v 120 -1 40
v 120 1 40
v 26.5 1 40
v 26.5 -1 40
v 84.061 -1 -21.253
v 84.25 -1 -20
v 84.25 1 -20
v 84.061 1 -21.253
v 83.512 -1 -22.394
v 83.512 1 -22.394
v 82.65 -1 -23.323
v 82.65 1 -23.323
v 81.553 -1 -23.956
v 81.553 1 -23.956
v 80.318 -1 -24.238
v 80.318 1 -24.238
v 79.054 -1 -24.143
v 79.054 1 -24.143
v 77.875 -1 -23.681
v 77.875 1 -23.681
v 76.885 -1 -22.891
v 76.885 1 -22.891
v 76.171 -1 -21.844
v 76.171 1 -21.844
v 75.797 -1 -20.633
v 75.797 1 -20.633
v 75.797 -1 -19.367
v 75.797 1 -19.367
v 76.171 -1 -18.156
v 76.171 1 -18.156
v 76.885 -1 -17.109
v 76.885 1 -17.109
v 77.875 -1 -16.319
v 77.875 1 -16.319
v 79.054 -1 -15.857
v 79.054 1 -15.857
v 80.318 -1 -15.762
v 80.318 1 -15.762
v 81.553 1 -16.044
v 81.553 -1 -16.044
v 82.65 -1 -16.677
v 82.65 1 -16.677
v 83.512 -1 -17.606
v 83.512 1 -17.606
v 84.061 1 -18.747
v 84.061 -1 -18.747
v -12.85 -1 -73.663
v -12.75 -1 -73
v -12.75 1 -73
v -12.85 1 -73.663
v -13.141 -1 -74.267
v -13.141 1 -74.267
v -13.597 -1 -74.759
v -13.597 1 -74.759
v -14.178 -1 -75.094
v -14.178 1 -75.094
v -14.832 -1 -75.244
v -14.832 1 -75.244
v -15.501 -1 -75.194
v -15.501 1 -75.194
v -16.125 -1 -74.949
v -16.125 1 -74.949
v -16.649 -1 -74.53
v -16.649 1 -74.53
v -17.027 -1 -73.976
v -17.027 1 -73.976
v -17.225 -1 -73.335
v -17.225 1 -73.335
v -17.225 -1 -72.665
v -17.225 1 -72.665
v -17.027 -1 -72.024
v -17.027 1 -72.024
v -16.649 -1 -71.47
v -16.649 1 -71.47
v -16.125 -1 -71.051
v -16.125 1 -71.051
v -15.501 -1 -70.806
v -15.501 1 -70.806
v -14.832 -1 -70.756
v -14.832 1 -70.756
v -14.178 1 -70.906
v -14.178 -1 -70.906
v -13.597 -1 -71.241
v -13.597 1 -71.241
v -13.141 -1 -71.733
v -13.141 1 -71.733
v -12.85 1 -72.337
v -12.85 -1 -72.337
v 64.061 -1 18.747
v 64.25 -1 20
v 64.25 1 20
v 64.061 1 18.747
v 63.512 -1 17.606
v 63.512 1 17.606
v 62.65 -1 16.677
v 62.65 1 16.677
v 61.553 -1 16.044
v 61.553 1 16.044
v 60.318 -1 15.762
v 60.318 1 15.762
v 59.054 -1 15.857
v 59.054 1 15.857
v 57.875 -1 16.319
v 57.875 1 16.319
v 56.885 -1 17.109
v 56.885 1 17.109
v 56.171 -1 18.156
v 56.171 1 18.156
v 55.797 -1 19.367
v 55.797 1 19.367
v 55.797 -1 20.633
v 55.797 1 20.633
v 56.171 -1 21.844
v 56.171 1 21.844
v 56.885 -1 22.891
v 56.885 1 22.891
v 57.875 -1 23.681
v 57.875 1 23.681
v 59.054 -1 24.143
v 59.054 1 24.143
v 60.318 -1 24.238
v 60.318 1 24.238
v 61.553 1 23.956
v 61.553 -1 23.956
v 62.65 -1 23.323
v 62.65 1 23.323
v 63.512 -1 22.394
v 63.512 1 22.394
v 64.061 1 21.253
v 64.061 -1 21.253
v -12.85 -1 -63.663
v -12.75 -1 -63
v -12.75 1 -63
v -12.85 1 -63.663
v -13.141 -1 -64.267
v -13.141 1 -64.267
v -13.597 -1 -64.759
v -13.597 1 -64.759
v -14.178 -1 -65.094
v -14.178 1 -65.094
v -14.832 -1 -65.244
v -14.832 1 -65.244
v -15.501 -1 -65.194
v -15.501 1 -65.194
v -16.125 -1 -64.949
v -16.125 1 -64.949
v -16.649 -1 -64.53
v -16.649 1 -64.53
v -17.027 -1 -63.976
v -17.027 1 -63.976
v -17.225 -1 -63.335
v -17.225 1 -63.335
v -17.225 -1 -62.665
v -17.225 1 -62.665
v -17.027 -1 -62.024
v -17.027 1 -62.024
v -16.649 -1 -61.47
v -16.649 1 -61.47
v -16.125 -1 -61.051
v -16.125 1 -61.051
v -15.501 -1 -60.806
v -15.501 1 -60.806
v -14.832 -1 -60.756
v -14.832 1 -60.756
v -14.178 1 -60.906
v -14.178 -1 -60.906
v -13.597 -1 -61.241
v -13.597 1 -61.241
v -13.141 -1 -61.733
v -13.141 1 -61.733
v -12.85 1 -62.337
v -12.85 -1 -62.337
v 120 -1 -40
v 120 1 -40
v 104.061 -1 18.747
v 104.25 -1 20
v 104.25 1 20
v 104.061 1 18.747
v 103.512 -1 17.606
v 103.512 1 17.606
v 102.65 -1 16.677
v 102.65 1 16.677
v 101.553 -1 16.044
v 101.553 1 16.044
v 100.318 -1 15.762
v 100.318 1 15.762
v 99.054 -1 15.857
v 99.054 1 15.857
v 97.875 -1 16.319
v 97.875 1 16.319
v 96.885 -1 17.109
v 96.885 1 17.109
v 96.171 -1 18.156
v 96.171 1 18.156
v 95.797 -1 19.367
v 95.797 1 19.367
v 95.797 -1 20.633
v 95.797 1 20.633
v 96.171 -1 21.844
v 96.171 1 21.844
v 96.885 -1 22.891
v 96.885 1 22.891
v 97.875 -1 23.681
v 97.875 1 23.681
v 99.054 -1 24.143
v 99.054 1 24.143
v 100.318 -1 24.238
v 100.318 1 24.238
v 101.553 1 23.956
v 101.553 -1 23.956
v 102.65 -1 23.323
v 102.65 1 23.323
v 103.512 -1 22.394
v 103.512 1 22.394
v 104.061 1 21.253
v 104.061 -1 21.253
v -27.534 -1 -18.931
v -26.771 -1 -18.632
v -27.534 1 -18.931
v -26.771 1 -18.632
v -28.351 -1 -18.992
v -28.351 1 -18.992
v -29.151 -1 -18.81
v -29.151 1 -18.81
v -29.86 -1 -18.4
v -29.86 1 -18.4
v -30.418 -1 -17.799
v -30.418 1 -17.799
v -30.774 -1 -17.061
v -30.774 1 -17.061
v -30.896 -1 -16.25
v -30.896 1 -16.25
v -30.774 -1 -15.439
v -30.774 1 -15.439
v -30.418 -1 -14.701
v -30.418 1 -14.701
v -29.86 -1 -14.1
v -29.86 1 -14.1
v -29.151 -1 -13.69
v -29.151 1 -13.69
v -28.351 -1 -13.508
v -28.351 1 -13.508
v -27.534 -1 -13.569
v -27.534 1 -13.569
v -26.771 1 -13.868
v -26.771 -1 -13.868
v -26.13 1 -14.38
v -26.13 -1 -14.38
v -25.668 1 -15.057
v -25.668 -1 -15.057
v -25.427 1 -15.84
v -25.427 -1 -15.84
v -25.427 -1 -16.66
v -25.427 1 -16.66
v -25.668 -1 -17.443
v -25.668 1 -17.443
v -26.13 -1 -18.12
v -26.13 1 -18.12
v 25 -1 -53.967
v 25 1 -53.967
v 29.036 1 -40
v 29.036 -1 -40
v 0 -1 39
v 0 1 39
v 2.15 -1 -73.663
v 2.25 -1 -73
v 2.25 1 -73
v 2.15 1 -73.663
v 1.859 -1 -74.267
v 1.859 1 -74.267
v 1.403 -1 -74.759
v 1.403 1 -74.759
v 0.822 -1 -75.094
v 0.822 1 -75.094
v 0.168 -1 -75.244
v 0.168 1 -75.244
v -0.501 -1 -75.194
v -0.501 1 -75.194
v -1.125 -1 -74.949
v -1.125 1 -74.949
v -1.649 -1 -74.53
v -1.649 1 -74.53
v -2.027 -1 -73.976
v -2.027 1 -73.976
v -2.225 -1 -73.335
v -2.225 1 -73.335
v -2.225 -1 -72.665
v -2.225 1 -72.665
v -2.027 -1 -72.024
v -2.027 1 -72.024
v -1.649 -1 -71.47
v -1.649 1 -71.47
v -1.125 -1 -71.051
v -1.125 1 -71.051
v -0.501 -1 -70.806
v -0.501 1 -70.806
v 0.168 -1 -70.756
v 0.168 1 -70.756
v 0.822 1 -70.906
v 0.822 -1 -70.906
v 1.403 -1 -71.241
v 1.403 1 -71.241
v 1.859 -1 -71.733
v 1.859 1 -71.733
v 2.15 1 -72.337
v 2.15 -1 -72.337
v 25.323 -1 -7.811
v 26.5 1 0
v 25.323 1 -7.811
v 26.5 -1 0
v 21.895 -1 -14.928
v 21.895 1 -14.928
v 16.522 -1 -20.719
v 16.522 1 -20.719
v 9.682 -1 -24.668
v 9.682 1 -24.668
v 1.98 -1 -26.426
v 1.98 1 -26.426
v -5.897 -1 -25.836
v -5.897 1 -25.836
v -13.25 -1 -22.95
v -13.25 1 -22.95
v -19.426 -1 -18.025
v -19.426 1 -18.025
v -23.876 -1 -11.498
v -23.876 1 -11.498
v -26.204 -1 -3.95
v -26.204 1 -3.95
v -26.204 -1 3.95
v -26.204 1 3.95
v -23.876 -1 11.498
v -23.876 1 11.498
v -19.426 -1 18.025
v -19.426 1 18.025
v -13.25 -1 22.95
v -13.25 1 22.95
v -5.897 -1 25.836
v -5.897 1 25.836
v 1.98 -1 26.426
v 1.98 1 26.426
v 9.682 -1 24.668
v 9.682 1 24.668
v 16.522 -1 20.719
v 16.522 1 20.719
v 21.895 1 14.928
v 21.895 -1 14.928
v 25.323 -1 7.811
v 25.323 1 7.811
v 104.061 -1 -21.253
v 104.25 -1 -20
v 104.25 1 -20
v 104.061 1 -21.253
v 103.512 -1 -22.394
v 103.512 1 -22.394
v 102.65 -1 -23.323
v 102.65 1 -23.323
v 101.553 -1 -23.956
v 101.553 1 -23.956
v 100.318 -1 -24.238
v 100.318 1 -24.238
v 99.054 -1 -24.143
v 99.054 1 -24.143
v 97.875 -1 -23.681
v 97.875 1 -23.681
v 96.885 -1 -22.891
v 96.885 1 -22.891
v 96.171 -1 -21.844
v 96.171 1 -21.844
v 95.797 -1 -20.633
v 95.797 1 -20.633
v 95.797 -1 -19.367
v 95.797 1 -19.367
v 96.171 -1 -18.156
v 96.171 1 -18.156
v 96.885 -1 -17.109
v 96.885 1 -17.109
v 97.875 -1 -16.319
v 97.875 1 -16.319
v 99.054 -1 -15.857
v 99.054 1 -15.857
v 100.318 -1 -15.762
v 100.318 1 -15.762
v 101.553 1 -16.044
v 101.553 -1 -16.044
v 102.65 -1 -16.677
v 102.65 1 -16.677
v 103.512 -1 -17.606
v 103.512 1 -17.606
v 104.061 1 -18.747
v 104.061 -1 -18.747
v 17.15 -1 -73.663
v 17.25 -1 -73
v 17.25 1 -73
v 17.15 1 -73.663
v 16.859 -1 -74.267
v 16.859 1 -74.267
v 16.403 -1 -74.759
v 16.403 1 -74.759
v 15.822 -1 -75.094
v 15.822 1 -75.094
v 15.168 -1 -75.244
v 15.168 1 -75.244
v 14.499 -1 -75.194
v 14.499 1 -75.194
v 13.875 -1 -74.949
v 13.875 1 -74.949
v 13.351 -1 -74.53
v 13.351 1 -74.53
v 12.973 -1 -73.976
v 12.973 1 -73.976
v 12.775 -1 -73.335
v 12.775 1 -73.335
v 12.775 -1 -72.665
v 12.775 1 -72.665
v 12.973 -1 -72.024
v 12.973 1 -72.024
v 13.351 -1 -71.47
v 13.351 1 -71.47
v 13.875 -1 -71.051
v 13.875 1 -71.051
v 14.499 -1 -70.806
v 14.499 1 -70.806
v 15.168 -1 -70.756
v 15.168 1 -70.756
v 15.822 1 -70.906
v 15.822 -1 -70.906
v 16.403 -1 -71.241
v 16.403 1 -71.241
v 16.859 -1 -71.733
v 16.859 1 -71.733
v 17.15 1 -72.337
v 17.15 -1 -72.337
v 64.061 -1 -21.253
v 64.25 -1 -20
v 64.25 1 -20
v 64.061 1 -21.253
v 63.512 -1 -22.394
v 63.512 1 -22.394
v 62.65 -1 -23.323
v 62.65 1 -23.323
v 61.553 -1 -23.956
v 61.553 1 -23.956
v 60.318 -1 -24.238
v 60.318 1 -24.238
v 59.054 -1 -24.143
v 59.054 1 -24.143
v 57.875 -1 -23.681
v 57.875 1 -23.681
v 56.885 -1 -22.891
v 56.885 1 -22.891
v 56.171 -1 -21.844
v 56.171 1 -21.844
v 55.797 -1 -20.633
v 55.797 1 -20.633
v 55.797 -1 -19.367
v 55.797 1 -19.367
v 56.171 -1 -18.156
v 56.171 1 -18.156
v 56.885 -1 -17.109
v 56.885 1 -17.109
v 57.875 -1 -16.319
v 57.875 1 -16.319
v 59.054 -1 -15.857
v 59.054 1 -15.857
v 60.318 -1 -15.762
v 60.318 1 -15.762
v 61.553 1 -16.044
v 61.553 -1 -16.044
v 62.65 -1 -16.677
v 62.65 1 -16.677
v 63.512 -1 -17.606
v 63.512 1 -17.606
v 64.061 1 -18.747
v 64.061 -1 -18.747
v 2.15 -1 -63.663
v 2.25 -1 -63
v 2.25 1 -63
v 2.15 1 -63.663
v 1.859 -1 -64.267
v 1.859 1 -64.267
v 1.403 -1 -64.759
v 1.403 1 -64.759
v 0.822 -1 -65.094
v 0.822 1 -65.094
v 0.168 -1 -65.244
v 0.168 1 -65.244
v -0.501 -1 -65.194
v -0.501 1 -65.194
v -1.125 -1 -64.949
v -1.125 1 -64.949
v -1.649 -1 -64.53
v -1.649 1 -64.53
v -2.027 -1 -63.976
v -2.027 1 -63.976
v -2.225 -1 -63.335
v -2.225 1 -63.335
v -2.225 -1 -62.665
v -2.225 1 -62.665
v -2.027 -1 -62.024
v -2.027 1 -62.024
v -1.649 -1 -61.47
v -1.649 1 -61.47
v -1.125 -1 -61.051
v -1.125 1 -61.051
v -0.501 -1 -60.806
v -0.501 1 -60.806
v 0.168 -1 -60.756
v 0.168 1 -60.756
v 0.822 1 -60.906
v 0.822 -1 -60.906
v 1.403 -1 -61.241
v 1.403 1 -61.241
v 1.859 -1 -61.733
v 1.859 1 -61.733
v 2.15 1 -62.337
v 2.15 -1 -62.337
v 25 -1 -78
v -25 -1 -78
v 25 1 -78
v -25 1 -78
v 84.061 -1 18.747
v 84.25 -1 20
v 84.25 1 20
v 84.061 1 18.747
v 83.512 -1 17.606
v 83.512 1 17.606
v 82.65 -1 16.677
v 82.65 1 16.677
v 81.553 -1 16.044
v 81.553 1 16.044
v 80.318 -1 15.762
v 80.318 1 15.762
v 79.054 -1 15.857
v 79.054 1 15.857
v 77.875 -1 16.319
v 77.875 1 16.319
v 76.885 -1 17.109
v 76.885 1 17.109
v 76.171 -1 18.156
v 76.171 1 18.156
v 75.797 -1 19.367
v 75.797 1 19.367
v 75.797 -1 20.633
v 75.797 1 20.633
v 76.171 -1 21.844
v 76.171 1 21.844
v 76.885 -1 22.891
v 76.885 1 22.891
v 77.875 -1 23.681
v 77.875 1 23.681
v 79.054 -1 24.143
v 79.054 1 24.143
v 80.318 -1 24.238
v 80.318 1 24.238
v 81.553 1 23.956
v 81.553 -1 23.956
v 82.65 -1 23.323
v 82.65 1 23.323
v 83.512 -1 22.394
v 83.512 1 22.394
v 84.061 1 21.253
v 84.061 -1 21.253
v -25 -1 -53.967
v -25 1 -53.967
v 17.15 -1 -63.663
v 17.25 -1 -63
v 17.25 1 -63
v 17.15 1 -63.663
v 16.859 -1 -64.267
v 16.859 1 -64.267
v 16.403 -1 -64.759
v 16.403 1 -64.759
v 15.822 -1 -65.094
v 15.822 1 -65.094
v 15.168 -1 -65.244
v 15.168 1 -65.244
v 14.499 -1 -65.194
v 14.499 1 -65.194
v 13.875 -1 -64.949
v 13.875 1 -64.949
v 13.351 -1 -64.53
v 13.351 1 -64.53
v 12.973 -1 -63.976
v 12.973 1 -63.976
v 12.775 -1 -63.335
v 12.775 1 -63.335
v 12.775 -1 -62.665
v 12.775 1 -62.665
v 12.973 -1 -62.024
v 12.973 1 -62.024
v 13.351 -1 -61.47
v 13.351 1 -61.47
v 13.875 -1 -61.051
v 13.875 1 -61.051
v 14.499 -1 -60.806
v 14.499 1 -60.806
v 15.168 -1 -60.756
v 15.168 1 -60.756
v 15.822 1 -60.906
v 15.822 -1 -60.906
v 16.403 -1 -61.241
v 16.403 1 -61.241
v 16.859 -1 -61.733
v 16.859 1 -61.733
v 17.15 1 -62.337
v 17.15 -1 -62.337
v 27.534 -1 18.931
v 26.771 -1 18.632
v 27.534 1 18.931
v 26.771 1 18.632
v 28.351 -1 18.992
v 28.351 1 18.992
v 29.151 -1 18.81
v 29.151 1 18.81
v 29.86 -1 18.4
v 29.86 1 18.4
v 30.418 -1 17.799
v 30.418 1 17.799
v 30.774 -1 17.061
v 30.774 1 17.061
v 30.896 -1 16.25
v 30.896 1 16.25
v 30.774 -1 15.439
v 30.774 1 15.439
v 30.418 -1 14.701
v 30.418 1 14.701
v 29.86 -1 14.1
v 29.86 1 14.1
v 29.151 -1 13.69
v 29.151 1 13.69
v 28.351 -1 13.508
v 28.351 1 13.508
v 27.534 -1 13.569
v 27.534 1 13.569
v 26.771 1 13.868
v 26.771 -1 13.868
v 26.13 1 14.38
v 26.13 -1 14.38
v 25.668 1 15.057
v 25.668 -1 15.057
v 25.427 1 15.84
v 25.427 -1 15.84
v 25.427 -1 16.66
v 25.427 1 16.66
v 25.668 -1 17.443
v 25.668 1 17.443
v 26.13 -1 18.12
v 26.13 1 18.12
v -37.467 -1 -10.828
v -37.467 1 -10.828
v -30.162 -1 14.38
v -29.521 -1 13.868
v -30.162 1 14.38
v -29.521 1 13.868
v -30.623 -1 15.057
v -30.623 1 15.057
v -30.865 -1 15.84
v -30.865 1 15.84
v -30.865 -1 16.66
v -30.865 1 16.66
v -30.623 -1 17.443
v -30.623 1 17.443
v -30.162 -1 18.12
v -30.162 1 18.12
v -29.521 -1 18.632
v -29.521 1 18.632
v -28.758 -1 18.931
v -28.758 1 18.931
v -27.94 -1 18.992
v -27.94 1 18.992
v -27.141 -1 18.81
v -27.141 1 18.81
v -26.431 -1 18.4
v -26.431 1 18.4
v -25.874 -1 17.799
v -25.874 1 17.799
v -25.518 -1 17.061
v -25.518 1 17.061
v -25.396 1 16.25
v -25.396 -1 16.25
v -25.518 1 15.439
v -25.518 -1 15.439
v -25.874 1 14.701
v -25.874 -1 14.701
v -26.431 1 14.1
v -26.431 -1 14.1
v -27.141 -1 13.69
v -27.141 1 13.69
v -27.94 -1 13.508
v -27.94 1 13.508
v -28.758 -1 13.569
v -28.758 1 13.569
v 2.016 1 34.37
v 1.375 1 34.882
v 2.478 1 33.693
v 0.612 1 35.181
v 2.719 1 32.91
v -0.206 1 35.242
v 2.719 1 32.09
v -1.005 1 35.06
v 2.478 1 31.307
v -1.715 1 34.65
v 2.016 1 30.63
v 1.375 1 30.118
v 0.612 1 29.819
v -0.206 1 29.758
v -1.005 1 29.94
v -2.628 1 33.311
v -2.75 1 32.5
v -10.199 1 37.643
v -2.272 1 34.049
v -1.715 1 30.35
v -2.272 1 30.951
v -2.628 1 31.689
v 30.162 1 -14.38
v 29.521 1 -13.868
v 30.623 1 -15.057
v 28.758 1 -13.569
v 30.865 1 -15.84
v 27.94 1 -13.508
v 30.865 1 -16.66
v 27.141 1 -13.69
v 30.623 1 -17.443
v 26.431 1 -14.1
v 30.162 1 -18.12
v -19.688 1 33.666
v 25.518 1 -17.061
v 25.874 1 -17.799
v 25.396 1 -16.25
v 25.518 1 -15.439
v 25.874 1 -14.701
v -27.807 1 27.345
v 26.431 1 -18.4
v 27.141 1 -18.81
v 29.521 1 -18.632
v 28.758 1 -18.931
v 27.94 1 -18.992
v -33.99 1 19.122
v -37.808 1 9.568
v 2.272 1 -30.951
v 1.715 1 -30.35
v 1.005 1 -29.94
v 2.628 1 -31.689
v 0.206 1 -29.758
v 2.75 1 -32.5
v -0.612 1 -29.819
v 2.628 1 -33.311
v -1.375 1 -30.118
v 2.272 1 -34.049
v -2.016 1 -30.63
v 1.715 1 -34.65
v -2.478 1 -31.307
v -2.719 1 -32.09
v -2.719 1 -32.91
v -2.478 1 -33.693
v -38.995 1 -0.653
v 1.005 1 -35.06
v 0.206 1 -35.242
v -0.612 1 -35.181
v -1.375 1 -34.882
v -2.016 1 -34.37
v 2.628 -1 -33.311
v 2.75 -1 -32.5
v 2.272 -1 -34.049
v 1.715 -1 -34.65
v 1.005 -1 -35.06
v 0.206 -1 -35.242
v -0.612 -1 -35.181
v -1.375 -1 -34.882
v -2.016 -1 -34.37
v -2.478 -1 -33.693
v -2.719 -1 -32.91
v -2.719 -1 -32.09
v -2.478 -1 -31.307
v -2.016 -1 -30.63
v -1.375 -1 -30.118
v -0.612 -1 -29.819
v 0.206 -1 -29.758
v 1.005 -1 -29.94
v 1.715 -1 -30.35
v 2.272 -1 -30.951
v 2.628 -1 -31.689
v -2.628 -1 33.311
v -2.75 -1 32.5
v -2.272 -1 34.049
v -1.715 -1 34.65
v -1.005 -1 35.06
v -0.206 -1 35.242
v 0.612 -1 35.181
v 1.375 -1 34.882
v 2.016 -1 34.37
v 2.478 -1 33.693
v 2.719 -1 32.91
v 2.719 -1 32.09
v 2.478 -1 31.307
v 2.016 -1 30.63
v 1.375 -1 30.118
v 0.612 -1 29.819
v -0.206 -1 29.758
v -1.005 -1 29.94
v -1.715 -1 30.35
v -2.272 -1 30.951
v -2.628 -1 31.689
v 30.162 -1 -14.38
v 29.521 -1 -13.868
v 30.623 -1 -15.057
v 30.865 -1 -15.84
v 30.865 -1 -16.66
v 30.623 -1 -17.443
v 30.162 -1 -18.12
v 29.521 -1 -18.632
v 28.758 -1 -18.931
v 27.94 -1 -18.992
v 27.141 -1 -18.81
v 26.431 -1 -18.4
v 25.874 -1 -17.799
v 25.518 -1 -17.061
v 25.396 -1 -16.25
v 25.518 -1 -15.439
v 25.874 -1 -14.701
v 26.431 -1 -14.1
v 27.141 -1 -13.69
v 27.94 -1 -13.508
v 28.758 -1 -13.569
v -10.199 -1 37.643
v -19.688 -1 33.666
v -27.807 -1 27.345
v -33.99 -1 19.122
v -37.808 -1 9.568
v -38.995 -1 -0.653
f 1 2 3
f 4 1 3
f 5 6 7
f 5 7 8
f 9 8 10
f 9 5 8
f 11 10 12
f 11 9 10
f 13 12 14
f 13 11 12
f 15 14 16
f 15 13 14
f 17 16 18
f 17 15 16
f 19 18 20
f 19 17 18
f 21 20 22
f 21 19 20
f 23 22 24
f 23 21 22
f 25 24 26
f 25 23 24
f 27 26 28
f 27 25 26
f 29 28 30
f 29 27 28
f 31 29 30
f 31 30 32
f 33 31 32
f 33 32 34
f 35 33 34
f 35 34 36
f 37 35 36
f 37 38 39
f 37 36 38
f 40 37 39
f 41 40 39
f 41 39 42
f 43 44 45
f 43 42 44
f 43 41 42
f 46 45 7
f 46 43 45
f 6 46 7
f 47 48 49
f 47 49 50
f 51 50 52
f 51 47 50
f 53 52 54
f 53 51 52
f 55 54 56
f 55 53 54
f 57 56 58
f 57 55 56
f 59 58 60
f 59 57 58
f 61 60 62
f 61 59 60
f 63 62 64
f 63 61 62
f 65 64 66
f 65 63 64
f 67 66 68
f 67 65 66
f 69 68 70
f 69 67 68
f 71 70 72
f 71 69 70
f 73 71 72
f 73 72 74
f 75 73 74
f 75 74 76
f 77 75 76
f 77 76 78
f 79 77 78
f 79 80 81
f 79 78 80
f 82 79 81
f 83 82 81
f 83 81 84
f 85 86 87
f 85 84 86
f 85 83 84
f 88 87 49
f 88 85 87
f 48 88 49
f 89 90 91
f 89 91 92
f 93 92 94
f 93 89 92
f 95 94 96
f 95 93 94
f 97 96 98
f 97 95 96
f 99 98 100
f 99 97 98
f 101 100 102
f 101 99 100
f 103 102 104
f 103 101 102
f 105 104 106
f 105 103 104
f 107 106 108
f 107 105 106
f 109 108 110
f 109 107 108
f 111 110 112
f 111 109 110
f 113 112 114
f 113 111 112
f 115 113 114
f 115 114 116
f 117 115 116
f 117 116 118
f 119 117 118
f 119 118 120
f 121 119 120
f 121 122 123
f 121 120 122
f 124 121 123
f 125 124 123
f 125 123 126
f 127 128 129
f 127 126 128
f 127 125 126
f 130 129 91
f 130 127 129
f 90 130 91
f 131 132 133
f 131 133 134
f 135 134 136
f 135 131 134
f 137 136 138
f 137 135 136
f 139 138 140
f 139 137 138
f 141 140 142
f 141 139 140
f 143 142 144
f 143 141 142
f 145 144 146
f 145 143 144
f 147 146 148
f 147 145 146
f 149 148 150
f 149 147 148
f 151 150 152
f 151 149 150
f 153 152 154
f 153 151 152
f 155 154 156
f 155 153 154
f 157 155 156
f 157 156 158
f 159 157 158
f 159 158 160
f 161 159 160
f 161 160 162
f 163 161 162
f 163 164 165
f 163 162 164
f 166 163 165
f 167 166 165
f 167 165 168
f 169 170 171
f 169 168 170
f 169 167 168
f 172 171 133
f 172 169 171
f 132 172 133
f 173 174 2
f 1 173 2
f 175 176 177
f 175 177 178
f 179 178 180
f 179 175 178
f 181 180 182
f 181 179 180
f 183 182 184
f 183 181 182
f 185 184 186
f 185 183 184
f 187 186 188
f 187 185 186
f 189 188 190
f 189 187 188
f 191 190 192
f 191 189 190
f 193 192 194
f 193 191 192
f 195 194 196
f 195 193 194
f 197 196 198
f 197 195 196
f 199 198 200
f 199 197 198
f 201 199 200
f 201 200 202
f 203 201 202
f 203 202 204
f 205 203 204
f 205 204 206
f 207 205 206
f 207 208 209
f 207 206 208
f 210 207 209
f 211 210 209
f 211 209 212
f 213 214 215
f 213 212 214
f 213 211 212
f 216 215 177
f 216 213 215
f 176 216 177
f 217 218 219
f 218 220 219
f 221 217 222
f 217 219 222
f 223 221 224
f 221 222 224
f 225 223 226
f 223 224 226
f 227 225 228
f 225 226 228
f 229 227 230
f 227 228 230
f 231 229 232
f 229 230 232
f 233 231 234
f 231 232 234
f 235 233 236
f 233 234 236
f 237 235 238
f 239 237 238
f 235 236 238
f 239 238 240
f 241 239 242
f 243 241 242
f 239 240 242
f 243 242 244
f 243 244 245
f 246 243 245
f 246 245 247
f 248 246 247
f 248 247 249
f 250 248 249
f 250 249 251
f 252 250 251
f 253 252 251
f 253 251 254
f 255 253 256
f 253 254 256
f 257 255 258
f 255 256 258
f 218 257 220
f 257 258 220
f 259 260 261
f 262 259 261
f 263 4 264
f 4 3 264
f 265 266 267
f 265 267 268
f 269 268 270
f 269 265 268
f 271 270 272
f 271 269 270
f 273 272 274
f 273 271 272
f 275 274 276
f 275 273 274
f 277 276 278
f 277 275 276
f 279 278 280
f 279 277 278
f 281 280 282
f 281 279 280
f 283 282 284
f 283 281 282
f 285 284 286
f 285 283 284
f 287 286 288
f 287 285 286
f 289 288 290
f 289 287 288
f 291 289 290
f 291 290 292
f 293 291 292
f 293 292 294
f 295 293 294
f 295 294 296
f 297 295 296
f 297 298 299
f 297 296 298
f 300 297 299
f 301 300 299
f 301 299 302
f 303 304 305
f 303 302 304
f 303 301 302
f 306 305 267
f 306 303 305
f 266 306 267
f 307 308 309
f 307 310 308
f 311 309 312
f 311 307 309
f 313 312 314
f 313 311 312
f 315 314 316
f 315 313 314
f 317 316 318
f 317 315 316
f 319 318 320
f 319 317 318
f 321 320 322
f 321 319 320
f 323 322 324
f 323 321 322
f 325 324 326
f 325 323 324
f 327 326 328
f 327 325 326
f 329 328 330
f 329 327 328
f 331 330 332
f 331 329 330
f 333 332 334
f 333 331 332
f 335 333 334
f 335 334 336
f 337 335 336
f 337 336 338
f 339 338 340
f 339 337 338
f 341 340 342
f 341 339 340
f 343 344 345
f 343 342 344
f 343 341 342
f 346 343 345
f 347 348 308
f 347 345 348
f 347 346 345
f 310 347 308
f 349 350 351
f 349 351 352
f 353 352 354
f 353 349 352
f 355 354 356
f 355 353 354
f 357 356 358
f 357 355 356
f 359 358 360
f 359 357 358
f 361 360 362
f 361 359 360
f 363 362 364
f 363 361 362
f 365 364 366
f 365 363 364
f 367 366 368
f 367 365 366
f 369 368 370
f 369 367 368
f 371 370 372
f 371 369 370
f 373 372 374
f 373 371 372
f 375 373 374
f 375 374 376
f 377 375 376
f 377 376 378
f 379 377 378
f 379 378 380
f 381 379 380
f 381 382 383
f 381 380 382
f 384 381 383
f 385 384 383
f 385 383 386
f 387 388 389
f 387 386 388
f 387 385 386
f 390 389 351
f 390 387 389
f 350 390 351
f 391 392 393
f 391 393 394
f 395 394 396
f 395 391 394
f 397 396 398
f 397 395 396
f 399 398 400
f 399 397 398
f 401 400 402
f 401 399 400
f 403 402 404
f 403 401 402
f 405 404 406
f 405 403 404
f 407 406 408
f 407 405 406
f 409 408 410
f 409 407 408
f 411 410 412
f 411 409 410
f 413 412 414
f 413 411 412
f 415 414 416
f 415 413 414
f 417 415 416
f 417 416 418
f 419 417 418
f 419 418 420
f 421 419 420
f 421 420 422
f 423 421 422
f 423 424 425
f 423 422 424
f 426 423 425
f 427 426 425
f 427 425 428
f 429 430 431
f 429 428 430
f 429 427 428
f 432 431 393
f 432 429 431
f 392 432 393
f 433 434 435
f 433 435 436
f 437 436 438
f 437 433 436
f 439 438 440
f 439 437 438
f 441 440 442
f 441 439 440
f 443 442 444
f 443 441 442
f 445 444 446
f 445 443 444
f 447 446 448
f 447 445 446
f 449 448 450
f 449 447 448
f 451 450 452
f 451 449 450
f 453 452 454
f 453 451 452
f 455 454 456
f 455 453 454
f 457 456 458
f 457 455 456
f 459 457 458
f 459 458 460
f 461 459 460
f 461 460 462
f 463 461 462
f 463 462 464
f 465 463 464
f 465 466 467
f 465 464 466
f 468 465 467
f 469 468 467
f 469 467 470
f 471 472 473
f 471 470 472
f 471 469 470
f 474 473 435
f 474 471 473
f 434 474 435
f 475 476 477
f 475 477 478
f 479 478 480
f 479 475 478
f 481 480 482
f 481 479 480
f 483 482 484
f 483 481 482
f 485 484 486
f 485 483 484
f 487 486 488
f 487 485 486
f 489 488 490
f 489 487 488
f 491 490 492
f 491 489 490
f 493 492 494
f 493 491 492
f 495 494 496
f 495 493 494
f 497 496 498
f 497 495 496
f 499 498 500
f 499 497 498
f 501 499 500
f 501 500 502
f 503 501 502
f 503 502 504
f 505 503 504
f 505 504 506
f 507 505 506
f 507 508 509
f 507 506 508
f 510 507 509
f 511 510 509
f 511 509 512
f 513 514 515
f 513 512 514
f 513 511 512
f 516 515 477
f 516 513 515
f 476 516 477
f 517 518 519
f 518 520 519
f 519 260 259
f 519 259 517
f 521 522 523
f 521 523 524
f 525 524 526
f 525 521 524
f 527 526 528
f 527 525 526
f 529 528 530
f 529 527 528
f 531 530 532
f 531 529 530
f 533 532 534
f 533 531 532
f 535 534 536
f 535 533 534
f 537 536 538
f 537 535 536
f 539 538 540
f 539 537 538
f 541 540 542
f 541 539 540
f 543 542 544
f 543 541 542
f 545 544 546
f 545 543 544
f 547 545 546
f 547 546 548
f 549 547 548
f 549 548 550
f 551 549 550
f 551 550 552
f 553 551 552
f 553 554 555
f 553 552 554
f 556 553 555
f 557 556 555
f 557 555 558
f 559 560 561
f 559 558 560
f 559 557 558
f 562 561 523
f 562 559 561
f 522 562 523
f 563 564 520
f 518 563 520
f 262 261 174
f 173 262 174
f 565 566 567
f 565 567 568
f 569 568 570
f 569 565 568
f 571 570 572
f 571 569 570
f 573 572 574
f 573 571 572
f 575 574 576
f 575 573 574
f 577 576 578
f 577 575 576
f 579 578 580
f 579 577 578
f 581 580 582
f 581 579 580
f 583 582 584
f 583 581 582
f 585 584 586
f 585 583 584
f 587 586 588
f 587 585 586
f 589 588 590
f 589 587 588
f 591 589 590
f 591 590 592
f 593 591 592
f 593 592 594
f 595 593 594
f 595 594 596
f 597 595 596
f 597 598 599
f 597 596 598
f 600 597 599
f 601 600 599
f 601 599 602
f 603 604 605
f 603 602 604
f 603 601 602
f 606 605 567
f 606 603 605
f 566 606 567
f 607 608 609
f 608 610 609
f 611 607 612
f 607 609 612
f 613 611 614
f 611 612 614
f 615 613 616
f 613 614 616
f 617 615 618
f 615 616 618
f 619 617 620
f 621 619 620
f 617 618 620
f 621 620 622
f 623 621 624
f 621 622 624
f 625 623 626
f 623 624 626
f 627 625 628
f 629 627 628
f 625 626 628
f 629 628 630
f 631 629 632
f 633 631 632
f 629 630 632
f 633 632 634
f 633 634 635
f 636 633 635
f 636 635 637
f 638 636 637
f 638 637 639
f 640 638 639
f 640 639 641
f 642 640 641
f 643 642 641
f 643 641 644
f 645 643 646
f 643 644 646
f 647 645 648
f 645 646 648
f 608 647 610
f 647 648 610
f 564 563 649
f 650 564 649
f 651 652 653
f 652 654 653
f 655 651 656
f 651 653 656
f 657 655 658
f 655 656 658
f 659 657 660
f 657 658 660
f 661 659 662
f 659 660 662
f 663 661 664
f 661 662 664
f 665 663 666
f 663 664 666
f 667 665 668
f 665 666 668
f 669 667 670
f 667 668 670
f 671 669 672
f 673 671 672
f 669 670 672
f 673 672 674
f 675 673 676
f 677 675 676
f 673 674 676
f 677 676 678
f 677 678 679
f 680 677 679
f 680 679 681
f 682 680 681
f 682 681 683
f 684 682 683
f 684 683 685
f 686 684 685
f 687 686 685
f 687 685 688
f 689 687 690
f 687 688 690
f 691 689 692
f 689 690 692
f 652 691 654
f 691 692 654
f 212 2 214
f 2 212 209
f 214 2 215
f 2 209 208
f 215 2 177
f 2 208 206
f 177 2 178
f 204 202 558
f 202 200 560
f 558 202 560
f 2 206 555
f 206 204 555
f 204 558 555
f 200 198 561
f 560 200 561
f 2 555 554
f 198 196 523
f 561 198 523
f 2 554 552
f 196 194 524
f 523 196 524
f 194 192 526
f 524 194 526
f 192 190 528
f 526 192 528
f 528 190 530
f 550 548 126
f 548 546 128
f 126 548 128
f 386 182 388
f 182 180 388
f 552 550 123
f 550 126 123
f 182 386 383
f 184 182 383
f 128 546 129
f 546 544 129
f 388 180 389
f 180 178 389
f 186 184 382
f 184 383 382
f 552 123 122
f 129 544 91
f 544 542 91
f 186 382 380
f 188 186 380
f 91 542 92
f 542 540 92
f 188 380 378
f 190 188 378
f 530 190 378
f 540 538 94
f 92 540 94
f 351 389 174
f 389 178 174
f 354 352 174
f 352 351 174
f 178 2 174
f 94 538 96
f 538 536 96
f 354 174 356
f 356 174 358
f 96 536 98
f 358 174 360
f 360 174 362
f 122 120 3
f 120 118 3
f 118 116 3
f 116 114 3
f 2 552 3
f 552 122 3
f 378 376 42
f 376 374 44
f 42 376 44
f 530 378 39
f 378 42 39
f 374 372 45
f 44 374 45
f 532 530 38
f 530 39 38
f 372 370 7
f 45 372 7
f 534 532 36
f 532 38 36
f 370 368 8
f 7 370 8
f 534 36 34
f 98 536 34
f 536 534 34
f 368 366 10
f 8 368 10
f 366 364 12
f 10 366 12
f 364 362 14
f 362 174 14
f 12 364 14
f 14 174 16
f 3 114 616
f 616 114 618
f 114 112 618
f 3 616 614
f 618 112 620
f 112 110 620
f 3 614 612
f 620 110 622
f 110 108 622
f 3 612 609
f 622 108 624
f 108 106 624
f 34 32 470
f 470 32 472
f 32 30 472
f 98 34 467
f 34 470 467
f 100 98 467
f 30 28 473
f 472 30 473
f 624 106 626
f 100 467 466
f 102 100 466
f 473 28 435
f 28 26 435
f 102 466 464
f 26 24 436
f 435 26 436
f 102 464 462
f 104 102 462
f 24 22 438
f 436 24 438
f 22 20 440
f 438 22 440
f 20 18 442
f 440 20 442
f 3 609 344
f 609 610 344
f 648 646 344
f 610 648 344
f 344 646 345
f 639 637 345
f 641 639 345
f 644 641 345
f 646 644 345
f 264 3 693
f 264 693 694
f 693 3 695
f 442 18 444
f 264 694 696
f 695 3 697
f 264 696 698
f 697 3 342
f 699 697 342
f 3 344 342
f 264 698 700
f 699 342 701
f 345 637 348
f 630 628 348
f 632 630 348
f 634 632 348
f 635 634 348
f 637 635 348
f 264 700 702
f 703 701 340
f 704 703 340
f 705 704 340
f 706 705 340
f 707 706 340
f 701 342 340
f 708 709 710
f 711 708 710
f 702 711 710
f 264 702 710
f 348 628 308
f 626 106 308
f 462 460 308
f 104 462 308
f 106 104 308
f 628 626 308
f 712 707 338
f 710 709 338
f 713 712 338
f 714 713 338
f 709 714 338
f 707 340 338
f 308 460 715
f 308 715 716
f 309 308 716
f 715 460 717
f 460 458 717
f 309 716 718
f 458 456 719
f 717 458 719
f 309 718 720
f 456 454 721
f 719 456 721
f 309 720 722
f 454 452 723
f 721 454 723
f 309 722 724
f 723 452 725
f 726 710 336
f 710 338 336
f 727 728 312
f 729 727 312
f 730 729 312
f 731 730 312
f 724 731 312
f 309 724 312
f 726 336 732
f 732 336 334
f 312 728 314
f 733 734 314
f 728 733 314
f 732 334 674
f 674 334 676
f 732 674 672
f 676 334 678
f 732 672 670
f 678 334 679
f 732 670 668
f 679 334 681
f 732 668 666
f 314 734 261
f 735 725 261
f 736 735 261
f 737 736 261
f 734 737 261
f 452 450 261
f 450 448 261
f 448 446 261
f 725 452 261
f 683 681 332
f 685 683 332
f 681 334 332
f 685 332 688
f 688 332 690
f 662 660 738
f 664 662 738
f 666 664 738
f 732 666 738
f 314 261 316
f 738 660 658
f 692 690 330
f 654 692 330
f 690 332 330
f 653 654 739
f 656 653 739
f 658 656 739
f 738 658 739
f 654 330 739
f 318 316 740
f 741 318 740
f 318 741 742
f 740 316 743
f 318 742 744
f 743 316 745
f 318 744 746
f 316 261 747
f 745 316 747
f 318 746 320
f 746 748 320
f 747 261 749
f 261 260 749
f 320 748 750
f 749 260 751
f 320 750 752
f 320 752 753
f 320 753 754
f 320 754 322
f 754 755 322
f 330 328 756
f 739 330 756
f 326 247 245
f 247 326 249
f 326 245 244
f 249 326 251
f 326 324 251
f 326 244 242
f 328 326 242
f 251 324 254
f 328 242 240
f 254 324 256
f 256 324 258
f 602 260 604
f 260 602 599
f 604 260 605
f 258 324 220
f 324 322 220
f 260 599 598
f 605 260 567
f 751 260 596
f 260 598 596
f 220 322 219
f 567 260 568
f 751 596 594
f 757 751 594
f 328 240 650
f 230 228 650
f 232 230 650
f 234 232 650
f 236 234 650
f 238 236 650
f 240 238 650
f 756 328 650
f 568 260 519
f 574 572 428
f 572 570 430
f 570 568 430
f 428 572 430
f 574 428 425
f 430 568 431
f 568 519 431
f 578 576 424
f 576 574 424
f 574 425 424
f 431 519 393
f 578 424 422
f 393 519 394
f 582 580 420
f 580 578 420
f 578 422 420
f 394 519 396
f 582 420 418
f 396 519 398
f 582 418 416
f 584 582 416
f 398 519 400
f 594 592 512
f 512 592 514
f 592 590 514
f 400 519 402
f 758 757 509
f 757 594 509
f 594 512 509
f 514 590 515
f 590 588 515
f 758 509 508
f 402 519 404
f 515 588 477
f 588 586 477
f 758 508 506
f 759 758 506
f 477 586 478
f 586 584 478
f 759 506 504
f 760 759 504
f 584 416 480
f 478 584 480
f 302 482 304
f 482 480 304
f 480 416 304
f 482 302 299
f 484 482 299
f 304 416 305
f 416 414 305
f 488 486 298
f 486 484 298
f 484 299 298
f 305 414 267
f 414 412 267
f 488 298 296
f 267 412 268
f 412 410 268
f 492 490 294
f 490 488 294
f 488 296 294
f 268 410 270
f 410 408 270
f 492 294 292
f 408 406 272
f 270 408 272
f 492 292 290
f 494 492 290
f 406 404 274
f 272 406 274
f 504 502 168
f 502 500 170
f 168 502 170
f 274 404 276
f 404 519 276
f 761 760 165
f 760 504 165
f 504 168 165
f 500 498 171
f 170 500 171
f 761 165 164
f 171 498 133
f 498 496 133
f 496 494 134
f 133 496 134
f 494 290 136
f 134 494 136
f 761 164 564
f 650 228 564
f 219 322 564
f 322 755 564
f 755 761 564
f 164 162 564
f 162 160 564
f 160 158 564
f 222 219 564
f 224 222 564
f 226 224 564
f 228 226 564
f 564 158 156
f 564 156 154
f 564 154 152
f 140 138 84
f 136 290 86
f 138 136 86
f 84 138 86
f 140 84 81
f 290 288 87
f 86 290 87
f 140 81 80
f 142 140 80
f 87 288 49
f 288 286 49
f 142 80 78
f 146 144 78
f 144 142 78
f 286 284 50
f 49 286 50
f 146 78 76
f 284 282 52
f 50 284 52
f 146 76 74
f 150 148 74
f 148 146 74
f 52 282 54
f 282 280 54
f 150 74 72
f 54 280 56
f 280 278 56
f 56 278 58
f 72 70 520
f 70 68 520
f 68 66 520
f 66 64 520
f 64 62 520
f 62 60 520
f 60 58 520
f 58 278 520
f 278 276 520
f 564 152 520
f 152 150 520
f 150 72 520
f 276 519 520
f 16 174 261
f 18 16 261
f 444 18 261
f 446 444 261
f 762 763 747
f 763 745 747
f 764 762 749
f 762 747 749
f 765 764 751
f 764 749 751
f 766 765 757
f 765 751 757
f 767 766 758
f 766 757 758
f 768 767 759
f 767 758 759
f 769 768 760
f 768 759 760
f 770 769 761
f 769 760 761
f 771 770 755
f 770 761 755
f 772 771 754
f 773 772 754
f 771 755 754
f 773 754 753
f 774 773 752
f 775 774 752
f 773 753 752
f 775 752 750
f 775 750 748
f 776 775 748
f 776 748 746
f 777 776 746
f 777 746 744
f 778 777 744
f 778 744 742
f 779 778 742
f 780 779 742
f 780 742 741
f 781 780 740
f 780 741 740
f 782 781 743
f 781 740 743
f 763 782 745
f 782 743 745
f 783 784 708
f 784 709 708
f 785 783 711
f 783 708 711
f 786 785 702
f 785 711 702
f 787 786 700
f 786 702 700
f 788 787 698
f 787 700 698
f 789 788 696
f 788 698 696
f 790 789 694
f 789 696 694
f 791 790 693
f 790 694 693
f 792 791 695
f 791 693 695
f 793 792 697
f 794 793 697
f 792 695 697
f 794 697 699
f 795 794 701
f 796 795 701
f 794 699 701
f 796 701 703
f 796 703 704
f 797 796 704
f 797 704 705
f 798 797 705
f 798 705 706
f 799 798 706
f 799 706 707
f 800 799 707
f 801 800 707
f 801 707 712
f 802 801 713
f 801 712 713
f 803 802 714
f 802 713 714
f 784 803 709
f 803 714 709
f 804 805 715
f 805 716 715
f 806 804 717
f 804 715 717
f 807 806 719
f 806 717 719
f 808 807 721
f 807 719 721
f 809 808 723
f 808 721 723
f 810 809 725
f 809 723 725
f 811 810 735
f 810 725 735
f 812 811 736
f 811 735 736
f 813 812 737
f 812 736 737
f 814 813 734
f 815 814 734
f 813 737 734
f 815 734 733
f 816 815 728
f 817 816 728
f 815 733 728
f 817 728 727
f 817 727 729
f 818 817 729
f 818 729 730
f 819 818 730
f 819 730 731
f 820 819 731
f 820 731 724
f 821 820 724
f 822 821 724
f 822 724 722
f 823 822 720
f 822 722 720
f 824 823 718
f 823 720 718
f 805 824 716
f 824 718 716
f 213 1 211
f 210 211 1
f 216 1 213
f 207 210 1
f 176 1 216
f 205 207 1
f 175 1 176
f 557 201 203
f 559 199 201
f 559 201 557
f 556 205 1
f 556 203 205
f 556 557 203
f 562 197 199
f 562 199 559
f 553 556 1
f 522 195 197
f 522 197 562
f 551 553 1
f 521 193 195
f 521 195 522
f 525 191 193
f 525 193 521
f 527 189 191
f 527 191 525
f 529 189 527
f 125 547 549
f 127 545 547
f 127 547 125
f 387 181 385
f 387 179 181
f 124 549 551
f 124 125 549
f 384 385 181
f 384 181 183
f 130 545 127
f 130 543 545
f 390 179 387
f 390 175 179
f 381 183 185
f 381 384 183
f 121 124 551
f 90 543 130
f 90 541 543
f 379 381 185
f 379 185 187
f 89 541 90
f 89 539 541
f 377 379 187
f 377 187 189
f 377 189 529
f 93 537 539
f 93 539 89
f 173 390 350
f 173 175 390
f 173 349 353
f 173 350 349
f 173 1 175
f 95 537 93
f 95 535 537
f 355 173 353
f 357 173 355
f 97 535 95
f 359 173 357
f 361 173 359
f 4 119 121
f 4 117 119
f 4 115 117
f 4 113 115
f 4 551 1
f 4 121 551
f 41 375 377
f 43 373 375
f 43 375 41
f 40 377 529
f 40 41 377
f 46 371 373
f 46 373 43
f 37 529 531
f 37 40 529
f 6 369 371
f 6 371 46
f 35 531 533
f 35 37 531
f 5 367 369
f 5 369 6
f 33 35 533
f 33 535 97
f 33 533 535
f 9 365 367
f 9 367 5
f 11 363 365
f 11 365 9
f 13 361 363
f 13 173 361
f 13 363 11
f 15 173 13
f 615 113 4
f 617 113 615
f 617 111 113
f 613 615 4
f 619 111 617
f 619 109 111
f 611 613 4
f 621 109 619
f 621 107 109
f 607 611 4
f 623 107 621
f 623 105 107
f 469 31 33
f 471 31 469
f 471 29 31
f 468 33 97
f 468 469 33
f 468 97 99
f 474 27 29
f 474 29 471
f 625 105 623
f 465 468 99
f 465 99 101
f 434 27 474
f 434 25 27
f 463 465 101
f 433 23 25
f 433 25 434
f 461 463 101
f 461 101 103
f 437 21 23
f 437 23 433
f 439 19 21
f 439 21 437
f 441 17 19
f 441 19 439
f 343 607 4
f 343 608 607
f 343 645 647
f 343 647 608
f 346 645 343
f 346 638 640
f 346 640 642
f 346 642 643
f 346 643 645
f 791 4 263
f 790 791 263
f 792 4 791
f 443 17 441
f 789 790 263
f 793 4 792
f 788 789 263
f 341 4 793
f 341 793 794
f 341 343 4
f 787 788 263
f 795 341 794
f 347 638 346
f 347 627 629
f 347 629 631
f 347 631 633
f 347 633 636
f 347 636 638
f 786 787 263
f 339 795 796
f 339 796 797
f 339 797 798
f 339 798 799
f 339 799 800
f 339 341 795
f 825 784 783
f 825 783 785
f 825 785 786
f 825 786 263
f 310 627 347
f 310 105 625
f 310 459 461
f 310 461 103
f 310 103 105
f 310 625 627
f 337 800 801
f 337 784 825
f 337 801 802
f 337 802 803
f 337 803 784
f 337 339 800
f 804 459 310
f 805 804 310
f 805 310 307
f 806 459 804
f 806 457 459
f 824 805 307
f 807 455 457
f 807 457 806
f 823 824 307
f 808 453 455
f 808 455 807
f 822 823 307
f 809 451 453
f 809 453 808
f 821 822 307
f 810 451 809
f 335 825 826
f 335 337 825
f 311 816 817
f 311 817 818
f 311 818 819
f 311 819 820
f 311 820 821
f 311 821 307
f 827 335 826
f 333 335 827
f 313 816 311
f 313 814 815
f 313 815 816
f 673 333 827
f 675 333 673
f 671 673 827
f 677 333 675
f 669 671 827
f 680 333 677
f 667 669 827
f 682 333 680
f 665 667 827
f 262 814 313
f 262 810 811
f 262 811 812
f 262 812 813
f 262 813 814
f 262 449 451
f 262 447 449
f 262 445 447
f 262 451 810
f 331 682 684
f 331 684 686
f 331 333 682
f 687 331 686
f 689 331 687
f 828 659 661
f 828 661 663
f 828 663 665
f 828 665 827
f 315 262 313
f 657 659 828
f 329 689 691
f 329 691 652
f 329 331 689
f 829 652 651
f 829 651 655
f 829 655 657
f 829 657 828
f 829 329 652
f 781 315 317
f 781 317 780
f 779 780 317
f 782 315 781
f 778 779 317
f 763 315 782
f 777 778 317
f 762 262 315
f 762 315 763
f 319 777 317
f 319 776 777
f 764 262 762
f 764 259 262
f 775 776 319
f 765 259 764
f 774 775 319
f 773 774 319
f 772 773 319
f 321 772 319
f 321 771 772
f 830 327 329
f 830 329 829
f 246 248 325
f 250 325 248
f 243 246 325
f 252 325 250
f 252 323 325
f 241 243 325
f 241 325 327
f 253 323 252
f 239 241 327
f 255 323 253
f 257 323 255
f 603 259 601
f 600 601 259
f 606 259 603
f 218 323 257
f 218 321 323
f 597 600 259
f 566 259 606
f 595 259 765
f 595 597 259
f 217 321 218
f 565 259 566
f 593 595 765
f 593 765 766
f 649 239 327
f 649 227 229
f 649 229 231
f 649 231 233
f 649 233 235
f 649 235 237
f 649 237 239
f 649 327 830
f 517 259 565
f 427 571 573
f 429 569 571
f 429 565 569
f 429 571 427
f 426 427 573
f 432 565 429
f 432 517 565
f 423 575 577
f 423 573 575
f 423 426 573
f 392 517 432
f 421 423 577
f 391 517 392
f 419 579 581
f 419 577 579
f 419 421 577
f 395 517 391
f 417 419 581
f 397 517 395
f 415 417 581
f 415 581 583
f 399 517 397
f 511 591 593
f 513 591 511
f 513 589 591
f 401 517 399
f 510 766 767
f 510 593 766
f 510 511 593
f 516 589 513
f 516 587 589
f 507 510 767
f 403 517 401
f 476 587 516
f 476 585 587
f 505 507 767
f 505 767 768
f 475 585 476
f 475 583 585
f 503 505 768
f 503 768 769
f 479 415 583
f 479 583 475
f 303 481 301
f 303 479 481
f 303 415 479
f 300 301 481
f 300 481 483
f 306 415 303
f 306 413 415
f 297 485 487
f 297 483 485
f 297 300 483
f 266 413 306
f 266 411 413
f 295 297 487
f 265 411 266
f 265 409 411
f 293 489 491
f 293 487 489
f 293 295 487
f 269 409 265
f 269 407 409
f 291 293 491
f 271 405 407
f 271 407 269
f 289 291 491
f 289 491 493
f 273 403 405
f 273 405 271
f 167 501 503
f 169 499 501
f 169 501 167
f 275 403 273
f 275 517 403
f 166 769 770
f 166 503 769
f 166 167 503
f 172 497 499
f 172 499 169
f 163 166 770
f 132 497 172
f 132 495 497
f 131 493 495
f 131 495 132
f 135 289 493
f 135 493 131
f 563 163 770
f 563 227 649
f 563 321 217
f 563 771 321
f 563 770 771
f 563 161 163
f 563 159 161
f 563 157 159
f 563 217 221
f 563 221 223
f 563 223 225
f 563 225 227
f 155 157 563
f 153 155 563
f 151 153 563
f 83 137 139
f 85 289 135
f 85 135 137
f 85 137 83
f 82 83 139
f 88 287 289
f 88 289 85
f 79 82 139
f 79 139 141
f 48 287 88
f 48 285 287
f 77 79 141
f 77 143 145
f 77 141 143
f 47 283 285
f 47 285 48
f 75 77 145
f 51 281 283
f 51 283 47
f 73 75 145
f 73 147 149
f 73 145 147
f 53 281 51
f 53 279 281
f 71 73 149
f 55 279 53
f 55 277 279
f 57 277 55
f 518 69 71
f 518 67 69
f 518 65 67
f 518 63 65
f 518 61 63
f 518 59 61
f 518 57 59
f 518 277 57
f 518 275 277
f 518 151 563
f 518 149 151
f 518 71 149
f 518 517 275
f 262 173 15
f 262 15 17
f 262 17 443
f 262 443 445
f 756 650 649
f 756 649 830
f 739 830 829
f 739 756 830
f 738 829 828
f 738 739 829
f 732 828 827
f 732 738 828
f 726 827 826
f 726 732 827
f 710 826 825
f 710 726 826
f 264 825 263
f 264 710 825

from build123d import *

# Parameters (mm, degrees)
SKETCH1_R            = 39
SKETCH1_R_2          = 26.5
BOSS_EXTRUDE1_DEPTH  = 1
SKETCH3_W            = 50
SKETCH3_H            = 51.5
BOSS_EXTRUDE2_DEPTH  = 1
BOSS_EXTRUDE3_DEPTH  = 1
BOSS_EXTRUDE5_DEPTH  = 1
SKETCH2_R            = 2.75
CUT_EXTRUDE1_DEPTH   = 2
CIRPATTERN1_COUNT    = 6
CUT_EXTRUDE2_START   = -3
SKETCH5_R            = 2.25
CUT_EXTRUDE2_DEPTH   = 4
LPATTERN1_COUNT      = 2
LPATTERN1_PITCH      = 15
LPATTERN1_COUNT_DIR2 = 2
LPATTERN1_PITCH_DIR2 = 10
LPATTERN2_COUNT      = 2
LPATTERN2_PITCH      = 15
LPATTERN2_COUNT_DIR2 = 2
LPATTERN2_PITCH_DIR2 = 10
CUT_EXTRUDE3_START   = -3
SKETCH8_R            = 4.25
CUT_EXTRUDE3_DEPTH   = 4
LPATTERN3_COUNT      = 3
LPATTERN3_PITCH      = 20


with BuildPart() as part:
    # Sketch1 → Boss-Extrude1 (new body, symmetric)
    with BuildSketch(Plane(origin=(0, 0, 0), x_dir=(1, 0, 0), z_dir=(0, 1, 0))):
        Circle(SKETCH1_R)
        Circle(SKETCH1_R_2, mode=Mode.SUBTRACT)
    extrude(amount=BOSS_EXTRUDE1_DEPTH, both=True)

    # Sketch3 → Boss-Extrude2 (add, symmetric)
    with BuildSketch(Plane(origin=(0, 0, 0), x_dir=(1, 0, 0), z_dir=(0, 1, 0))):
        with Locations((0, 52.25)):
            Rectangle(SKETCH3_W, SKETCH3_H)
    extrude(amount=BOSS_EXTRUDE2_DEPTH, both=True)

    # Sketch4 → Boss-Extrude3 (add, symmetric)
    with BuildSketch(Plane(origin=(0, 0, 0), x_dir=(1, 0, 0), z_dir=(0, 1, 0))):
        Polygon((-25, 53.966629547), (-37.466824315, 10.827607112), (-25, 29.933259094), align=None)
        Polygon((37.466824315, 10.827607112), (25, 29.933259094), (25, 53.966629547), align=None)
    extrude(amount=BOSS_EXTRUDE3_DEPTH, both=True)

    # Sketch7 → Boss-Extrude5 (add, symmetric)
    with BuildSketch(Plane(origin=(0, 0, 0), x_dir=(1, 0, 0), z_dir=(0, 1, 0))):
        Polygon((120, -40), (26.5, -40), (0, -39), (26.5, -15.728301656), (26.5, 0), (26.5, 40), (120, 40), align=None)
    extrude(amount=BOSS_EXTRUDE5_DEPTH, both=True)

    # Sketch2 → Cut-Extrude1 (cut, symmetric)
    with BuildSketch(Plane(origin=(0, 0, 0), x_dir=(1, 0, 0), z_dir=(0, 1, 0))):
        with Locations((0, 32.5)):
            Circle(SKETCH2_R)
    cut_extrude1 = extrude(amount=CUT_EXTRUDE1_DEPTH, both=True, mode=Mode.SUBTRACT)

    # CirPattern1: Cut-Extrude1 ×6 about axis
    cirpattern1_axis = Axis((0, 0, 0), (0, 1, 0))
    for i in range(1, CIRPATTERN1_COUNT):
        add(cut_extrude1.rotate(cirpattern1_axis, i * 360 / CIRPATTERN1_COUNT), mode=Mode.SUBTRACT)

    # Sketch5 → Cut-Extrude2 (cut)
    with BuildSketch(Plane(origin=(0, 1, 0), x_dir=(1, 0, 0), z_dir=(0, 1, 0)).offset(CUT_EXTRUDE2_START)):
        with Locations((0, 73)):
            Circle(SKETCH5_R)
    cut_extrude2 = extrude(amount=CUT_EXTRUDE2_DEPTH, mode=Mode.SUBTRACT)

    # LPattern1: Cut-Extrude2 2 × 2
    with Locations(*[(i * LPATTERN1_PITCH, 0, j * LPATTERN1_PITCH_DIR2) for i in range(LPATTERN1_COUNT) for j in range(LPATTERN1_COUNT_DIR2) if (i, j) != (0, 0)]):
        add(cut_extrude2, mode=Mode.SUBTRACT)

    # LPattern2: Cut-Extrude2 2 × 2
    with Locations(*[(-i * LPATTERN2_PITCH, 0, j * LPATTERN2_PITCH_DIR2) for i in range(LPATTERN2_COUNT) for j in range(LPATTERN2_COUNT_DIR2) if (i, j) != (0, 0)]):
        add(cut_extrude2, mode=Mode.SUBTRACT)

    # Sketch8 → Cut-Extrude3 (cut)
    with BuildSketch(Plane(origin=(0, 1, 0), x_dir=(1, 0, 0), z_dir=(0, 1, 0)).offset(CUT_EXTRUDE3_START)):
        with Locations((60, 20)):
            Circle(SKETCH8_R)
        with Locations((60, -20)):
            Circle(SKETCH8_R)
    cut_extrude3 = extrude(amount=CUT_EXTRUDE3_DEPTH, mode=Mode.SUBTRACT)

    # LPattern3: Cut-Extrude3 ×3
    with Locations(*[(i * LPATTERN3_PITCH, 0, 0) for i in range(1, LPATTERN3_COUNT)]):
        add(cut_extrude3, mode=Mode.SUBTRACT)


solid = part.part
